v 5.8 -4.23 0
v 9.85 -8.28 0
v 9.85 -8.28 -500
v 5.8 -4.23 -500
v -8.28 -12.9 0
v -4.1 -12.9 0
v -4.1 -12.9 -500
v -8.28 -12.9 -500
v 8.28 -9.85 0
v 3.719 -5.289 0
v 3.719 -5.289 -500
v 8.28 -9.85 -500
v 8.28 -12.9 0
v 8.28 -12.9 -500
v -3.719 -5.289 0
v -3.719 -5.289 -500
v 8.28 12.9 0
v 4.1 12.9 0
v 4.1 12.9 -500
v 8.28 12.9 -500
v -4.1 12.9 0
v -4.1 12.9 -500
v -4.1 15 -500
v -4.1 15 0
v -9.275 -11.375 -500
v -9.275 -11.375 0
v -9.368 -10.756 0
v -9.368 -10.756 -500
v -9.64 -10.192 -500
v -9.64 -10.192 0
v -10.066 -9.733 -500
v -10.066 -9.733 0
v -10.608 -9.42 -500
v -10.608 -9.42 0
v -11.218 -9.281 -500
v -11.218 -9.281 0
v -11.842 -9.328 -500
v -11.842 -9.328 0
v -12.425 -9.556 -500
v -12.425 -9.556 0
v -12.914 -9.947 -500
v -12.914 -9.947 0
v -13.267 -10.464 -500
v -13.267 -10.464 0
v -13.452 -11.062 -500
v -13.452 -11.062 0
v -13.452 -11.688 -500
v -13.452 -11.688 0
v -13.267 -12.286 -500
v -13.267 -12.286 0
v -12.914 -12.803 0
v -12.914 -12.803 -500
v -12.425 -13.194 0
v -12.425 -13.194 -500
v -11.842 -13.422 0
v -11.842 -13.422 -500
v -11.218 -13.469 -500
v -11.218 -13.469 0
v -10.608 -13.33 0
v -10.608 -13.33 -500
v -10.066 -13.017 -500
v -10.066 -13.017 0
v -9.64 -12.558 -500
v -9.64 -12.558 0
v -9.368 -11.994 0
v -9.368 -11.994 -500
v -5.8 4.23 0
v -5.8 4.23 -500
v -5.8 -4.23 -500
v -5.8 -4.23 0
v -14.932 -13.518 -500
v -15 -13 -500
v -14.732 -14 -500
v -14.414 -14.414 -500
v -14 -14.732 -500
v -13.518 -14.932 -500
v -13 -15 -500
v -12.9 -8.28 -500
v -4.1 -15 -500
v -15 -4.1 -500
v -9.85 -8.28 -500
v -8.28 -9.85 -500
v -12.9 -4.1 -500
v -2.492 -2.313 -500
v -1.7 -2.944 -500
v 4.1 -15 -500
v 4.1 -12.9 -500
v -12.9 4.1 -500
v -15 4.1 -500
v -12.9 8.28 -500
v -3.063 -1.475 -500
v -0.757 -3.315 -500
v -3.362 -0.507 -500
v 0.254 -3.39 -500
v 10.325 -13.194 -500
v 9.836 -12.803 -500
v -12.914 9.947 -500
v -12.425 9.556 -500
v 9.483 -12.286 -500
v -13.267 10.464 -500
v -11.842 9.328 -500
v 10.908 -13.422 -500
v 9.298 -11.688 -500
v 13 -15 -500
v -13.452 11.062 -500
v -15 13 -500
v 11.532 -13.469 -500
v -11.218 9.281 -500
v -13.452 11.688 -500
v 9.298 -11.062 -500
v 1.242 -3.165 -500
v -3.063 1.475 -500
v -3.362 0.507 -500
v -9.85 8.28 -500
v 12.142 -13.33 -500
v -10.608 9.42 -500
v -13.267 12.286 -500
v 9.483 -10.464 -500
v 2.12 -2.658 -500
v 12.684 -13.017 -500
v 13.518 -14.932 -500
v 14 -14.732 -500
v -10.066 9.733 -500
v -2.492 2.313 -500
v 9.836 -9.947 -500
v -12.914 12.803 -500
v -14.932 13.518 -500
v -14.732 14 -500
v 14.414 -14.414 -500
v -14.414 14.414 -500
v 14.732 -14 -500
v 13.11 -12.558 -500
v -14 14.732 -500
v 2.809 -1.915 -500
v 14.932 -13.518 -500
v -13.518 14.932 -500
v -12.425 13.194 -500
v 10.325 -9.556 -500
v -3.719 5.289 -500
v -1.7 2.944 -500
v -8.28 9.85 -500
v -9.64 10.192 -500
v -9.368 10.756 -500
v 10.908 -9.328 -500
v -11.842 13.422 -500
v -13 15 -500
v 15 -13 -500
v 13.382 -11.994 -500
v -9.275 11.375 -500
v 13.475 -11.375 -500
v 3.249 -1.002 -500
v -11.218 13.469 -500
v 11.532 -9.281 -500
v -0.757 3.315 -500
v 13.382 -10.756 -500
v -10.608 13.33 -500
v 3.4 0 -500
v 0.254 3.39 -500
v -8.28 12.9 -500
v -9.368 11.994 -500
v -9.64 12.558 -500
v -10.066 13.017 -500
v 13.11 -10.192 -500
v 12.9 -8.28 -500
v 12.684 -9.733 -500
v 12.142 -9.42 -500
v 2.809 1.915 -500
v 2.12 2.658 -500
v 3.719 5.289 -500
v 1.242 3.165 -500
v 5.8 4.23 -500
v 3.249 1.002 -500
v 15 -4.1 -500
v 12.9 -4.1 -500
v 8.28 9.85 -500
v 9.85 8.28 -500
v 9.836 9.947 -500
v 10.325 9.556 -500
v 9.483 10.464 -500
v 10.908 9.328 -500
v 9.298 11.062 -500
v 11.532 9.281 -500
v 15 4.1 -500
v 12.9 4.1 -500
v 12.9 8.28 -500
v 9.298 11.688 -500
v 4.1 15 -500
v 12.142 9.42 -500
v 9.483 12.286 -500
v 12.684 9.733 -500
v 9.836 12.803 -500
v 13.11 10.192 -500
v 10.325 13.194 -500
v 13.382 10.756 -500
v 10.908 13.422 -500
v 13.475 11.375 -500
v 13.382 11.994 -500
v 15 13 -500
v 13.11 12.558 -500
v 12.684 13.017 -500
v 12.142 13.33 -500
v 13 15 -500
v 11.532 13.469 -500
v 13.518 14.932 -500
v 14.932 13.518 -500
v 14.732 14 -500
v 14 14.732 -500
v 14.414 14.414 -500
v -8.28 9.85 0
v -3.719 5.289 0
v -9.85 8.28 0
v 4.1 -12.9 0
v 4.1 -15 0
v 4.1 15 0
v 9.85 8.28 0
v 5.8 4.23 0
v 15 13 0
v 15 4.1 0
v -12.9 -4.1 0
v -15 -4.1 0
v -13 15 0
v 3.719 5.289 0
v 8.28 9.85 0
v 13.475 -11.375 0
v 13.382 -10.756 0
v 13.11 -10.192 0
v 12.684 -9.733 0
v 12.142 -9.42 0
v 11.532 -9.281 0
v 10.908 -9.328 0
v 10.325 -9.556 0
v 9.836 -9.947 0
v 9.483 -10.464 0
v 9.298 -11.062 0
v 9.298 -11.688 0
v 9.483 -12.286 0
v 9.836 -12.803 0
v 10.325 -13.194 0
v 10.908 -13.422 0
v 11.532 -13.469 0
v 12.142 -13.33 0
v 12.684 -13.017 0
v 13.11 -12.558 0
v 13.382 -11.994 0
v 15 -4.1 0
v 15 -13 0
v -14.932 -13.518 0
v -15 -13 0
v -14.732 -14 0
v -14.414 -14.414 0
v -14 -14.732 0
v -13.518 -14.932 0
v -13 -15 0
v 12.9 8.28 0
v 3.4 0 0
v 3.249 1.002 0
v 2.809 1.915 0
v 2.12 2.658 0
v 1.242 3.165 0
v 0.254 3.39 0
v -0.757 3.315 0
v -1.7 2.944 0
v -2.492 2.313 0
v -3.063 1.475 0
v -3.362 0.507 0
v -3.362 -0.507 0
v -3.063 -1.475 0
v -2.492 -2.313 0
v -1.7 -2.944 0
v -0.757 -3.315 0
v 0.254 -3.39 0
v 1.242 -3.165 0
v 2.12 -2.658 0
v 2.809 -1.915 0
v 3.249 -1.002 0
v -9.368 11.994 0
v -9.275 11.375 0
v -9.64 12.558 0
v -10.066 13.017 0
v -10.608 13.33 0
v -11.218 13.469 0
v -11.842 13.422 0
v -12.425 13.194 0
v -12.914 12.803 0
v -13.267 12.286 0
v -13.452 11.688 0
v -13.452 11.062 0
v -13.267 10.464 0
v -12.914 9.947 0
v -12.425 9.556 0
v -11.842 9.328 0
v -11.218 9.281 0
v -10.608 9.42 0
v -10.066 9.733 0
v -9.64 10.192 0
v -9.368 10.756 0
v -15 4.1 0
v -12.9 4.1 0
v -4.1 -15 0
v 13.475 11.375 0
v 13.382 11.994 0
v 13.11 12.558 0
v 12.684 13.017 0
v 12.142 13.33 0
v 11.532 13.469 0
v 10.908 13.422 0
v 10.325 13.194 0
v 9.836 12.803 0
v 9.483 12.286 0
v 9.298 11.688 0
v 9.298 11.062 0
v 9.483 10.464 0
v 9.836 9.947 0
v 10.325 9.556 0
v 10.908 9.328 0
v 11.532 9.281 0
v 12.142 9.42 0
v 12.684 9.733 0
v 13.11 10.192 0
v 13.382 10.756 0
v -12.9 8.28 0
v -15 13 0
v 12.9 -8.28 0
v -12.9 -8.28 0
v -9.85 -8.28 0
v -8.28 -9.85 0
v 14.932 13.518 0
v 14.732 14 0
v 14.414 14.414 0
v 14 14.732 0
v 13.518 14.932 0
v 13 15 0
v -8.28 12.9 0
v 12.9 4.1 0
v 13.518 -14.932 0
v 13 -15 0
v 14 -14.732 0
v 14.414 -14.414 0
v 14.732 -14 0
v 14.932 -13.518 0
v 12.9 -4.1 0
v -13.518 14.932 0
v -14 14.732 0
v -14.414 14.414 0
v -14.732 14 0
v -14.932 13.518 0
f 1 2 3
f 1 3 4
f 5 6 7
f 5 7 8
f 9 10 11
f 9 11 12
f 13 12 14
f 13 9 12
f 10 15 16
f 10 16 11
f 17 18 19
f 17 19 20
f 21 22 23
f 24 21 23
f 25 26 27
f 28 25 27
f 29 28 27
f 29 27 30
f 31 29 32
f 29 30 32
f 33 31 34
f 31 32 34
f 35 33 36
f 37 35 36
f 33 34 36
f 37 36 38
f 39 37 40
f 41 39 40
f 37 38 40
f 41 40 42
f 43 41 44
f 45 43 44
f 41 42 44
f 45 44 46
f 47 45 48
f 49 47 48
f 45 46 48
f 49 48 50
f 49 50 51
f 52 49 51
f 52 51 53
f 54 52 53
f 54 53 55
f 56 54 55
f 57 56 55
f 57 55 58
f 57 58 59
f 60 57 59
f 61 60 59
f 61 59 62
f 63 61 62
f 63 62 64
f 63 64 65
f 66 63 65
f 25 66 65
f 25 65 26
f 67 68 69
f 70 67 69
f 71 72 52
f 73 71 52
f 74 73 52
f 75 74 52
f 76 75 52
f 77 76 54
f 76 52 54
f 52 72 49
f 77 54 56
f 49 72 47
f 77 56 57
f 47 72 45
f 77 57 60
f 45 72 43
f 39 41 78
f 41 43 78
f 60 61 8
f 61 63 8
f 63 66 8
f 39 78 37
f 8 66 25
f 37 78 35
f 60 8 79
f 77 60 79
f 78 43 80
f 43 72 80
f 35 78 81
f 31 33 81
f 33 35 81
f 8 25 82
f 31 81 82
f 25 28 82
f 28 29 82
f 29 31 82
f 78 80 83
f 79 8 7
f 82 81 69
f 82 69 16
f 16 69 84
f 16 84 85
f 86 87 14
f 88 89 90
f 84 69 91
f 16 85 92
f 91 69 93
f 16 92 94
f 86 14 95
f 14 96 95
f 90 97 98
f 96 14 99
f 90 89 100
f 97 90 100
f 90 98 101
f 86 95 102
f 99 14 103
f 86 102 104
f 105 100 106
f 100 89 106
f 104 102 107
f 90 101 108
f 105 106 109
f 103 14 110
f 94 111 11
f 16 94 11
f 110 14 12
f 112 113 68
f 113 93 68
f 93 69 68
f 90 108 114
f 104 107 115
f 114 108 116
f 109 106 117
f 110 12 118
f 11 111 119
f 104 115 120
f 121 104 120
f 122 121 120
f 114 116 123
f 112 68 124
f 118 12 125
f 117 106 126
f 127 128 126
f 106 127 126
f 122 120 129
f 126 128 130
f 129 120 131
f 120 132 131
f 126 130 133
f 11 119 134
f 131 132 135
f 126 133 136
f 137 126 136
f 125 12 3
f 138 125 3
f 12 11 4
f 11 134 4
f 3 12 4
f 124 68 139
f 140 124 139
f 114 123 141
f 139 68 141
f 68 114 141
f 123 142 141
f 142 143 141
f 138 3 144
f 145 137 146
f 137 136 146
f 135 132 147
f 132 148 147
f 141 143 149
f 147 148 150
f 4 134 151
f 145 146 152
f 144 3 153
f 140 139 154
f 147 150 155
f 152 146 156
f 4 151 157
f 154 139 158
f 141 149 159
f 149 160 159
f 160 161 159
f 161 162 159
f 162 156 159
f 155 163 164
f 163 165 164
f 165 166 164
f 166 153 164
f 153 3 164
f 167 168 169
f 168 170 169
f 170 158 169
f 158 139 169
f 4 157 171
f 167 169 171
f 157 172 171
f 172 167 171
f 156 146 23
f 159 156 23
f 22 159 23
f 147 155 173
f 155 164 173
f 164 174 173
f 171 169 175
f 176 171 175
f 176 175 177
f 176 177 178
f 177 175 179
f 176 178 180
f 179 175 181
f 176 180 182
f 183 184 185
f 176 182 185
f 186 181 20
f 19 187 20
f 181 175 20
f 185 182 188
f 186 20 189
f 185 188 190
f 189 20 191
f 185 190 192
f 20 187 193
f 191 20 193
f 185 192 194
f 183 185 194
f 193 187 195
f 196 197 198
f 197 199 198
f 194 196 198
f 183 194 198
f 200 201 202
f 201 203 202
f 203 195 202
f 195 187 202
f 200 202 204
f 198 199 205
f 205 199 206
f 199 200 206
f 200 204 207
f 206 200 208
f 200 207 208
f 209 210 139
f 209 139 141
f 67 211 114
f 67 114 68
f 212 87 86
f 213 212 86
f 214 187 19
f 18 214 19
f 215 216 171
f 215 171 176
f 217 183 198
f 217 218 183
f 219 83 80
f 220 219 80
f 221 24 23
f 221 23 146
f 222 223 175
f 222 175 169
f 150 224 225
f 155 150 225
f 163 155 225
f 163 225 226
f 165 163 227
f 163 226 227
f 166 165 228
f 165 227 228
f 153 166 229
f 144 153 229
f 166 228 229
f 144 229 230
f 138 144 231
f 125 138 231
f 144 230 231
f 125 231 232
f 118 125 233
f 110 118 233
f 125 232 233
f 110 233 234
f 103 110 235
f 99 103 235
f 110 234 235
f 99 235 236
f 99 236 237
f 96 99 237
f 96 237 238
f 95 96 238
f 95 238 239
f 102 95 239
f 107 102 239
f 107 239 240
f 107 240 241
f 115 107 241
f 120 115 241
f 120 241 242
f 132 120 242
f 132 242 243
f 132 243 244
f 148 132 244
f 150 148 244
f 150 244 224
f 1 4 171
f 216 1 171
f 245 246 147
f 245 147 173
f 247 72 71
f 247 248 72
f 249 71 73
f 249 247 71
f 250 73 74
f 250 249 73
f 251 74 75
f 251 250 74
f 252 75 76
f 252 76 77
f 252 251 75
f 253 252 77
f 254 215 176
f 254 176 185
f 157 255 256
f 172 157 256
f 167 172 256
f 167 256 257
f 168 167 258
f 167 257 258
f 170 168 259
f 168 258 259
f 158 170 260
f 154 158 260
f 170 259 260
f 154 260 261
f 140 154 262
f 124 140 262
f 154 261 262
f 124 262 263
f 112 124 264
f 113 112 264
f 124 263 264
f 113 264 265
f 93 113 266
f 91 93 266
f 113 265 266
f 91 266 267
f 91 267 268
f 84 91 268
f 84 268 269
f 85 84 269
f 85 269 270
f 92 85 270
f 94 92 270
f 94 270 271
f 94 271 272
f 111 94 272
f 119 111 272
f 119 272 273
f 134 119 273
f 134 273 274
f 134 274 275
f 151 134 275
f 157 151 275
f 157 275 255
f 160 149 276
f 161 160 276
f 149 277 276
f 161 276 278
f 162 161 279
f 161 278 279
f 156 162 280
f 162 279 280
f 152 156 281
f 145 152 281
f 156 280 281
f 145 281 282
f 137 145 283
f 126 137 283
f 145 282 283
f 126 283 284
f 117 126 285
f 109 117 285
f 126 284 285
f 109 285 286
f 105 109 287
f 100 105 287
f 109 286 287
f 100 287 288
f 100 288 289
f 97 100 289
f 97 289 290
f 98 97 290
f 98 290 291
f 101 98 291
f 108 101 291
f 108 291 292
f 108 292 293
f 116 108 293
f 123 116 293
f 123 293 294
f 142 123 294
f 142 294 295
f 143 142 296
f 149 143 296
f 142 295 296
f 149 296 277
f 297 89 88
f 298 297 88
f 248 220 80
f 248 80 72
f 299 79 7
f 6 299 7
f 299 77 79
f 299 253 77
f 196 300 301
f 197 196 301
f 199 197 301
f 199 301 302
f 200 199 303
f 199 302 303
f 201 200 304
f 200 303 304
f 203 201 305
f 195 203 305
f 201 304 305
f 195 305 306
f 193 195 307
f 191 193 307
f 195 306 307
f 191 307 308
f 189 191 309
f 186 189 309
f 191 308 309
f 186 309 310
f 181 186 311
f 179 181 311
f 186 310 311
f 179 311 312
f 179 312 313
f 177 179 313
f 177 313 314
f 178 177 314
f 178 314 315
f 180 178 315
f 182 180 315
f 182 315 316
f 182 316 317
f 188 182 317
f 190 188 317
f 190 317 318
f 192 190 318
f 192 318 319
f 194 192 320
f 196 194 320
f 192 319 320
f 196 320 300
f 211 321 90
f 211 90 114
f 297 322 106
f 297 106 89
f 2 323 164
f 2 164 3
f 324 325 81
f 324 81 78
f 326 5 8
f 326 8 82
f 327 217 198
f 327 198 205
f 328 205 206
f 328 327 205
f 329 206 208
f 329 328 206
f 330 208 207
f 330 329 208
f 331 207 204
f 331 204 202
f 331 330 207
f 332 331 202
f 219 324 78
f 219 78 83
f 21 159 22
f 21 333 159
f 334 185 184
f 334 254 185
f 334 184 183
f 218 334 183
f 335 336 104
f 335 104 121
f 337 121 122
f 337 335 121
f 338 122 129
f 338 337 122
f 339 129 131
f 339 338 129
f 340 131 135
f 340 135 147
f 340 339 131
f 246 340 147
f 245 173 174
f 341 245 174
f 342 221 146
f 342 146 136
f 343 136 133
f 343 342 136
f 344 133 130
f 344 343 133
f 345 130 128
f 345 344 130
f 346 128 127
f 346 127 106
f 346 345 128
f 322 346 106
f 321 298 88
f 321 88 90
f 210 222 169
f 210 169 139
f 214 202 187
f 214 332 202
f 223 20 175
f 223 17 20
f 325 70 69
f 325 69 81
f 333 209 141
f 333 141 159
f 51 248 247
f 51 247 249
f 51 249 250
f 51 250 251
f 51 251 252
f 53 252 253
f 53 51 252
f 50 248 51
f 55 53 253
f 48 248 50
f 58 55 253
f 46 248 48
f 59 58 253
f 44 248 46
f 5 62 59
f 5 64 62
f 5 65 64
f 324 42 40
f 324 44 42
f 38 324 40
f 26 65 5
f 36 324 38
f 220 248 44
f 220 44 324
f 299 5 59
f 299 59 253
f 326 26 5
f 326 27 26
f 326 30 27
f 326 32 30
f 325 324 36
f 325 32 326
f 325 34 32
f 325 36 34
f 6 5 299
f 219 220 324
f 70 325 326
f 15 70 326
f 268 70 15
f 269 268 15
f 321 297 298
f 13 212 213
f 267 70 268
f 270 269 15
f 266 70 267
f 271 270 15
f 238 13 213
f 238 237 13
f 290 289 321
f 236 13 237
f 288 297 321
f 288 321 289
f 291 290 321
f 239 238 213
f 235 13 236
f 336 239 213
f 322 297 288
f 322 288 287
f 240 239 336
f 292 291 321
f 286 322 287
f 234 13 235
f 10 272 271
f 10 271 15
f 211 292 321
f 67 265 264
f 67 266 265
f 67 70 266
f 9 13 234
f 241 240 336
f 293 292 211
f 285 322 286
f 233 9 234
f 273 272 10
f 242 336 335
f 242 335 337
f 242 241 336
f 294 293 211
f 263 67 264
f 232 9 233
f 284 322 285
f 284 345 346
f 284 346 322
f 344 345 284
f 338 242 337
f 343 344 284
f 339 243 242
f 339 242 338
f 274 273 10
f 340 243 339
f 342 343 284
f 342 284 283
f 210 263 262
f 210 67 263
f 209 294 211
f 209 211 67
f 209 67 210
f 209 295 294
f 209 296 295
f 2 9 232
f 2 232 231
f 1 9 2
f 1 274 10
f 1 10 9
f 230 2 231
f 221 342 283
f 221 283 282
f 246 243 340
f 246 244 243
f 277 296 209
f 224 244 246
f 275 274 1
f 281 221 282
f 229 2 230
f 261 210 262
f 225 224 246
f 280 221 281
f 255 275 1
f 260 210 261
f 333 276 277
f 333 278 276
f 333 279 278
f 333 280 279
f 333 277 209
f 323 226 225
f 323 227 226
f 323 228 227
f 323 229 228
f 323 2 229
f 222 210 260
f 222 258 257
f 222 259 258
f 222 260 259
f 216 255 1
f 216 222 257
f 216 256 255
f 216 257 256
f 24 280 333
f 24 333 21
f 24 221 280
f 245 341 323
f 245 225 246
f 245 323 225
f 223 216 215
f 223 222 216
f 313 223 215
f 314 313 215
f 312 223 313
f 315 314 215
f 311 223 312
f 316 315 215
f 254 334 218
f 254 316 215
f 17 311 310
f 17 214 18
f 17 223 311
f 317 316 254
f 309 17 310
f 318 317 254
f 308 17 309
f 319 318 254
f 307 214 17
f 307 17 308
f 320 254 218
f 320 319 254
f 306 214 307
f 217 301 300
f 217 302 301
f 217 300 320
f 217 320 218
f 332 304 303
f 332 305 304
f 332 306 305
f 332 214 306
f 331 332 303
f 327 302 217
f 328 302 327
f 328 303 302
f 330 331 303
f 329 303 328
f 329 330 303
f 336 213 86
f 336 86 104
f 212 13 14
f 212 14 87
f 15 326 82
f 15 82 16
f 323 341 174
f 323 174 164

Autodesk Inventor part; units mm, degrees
ref_plane "YZ Plane" through (0, 0, 0) normal (1, 0, 0) x (0, 1, 0)
ref_plane "XZ Plane" through (0, 0, 0) normal (0, 1, 0) x (-1, 0, 0)
ref_plane "XY Plane" through (0, 0, 0) normal (0, 0, 1) x (1, 0, 0)
sketch "Sketch1" plane through (0, 0, 0) normal (0, 0, 1) x (1, 0, 0)
  circle A0 centre (-11.375, 11.375) radius 2.1
  circle A1 centre (-11.375, -11.375) radius 2.1
  line L0 (-15, 4.1) -> (-12.9, 4.1)
  line L1 (-12.9, 4.1) -> (-12.9, 8.28)
  line L2 (-12.9, 8.28) -> (-9.85, 8.28)
  line L3 (-9.85, 8.28) -> (-5.8, 4.23)
  line L4 (-5.8, 4.23) -> (-5.8, -4.23)
  line L5 (-5.8, -4.23) -> (-9.85, -8.28)
  line L6 (-9.85, -8.28) -> (-12.9, -8.28)
  line L7 (-12.9, -8.28) -> (-12.9, -4.1)
  line L8 (-12.9, -4.1) -> (-15, -4.1)
  line L9 (-15, -4.1) -> (-15, -13)
  arc A2 (-15, -13) -> (-13, -15) centre (-13, -13) ccw
  line L10 (-13, -15) -> (-4.1, -15)
  line L11 (-4.1, -15) -> (-4.1, -12.9)
  line L12 (-4.1, -12.9) -> (-8.28, -12.9)
  line L13 (-8.28, -12.9) -> (-8.28, -9.85)
  line L14 (-8.28, -9.85) -> (-3.719, -5.289)
  line L15 (-3.719, -5.289) -> (3.719, -5.289)
  line L16 (3.719, -5.289) -> (8.28, -9.85)
  line L17 (8.28, -9.85) -> (8.28, -12.9)
  line L18 (8.28, -12.9) -> (4.1, -12.9)
  line L19 (4.1, -12.9) -> (4.1, -15)
  line L20 (4.1, -15) -> (13, -15)
  arc A3 (13, -15) -> (15, -13) centre (13, -13) ccw
  line L21 (15, -13) -> (15, -4.1)
  line L22 (15, -4.1) -> (12.9, -4.1)
  line L23 (12.9, -4.1) -> (12.9, -8.28)
  line L24 (12.9, -8.28) -> (9.85, -8.28)
  line L25 (9.85, -8.28) -> (5.8, -4.23)
  line L26 (5.8, -4.23) -> (5.8, 4.23)
  line L27 (5.8, 4.23) -> (9.85, 8.28)
  line L28 (9.85, 8.28) -> (12.9, 8.28)
  line L29 (12.9, 8.28) -> (12.9, 4.1)
  line L30 (12.9, 4.1) -> (15, 4.1)
  line L31 (15, 4.1) -> (15, 13)
  arc A4 (15, 13) -> (13, 15) centre (13, 13) ccw
  line L32 (13, 15) -> (4.1, 15)
  line L33 (4.1, 15) -> (4.1, 12.9)
  line L34 (4.1, 12.9) -> (8.28, 12.9)
  line L35 (8.28, 12.9) -> (8.28, 9.85)
  line L36 (8.28, 9.85) -> (3.719, 5.289)
  line L37 (3.719, 5.289) -> (-3.719, 5.289)
  line L38 (-3.719, 5.289) -> (-8.28, 9.85)
  line L39 (-8.28, 9.85) -> (-8.28, 12.9)
  line L40 (-8.28, 12.9) -> (-4.1, 12.9)
  line L41 (-4.1, 12.9) -> (-4.1, 15)
  line L42 (-4.1, 15) -> (-13, 15)
  arc A5 (-13, 15) -> (-15, 13) centre (-13, 13) ccw
  line L43 (-15, 13) -> (-15, 4.1)
  circle A6 centre (0, 0) radius 3.4
  circle A7 centre (11.375, 11.375) radius 2.1
  circle A8 centre (11.375, -11.375) radius 2.1
extrude "Extrusion1" add sketch "Sketch1" against normal blind 500
properties part number "Metal Profile 50 cm" material "Aluminum 6061-AHC"
